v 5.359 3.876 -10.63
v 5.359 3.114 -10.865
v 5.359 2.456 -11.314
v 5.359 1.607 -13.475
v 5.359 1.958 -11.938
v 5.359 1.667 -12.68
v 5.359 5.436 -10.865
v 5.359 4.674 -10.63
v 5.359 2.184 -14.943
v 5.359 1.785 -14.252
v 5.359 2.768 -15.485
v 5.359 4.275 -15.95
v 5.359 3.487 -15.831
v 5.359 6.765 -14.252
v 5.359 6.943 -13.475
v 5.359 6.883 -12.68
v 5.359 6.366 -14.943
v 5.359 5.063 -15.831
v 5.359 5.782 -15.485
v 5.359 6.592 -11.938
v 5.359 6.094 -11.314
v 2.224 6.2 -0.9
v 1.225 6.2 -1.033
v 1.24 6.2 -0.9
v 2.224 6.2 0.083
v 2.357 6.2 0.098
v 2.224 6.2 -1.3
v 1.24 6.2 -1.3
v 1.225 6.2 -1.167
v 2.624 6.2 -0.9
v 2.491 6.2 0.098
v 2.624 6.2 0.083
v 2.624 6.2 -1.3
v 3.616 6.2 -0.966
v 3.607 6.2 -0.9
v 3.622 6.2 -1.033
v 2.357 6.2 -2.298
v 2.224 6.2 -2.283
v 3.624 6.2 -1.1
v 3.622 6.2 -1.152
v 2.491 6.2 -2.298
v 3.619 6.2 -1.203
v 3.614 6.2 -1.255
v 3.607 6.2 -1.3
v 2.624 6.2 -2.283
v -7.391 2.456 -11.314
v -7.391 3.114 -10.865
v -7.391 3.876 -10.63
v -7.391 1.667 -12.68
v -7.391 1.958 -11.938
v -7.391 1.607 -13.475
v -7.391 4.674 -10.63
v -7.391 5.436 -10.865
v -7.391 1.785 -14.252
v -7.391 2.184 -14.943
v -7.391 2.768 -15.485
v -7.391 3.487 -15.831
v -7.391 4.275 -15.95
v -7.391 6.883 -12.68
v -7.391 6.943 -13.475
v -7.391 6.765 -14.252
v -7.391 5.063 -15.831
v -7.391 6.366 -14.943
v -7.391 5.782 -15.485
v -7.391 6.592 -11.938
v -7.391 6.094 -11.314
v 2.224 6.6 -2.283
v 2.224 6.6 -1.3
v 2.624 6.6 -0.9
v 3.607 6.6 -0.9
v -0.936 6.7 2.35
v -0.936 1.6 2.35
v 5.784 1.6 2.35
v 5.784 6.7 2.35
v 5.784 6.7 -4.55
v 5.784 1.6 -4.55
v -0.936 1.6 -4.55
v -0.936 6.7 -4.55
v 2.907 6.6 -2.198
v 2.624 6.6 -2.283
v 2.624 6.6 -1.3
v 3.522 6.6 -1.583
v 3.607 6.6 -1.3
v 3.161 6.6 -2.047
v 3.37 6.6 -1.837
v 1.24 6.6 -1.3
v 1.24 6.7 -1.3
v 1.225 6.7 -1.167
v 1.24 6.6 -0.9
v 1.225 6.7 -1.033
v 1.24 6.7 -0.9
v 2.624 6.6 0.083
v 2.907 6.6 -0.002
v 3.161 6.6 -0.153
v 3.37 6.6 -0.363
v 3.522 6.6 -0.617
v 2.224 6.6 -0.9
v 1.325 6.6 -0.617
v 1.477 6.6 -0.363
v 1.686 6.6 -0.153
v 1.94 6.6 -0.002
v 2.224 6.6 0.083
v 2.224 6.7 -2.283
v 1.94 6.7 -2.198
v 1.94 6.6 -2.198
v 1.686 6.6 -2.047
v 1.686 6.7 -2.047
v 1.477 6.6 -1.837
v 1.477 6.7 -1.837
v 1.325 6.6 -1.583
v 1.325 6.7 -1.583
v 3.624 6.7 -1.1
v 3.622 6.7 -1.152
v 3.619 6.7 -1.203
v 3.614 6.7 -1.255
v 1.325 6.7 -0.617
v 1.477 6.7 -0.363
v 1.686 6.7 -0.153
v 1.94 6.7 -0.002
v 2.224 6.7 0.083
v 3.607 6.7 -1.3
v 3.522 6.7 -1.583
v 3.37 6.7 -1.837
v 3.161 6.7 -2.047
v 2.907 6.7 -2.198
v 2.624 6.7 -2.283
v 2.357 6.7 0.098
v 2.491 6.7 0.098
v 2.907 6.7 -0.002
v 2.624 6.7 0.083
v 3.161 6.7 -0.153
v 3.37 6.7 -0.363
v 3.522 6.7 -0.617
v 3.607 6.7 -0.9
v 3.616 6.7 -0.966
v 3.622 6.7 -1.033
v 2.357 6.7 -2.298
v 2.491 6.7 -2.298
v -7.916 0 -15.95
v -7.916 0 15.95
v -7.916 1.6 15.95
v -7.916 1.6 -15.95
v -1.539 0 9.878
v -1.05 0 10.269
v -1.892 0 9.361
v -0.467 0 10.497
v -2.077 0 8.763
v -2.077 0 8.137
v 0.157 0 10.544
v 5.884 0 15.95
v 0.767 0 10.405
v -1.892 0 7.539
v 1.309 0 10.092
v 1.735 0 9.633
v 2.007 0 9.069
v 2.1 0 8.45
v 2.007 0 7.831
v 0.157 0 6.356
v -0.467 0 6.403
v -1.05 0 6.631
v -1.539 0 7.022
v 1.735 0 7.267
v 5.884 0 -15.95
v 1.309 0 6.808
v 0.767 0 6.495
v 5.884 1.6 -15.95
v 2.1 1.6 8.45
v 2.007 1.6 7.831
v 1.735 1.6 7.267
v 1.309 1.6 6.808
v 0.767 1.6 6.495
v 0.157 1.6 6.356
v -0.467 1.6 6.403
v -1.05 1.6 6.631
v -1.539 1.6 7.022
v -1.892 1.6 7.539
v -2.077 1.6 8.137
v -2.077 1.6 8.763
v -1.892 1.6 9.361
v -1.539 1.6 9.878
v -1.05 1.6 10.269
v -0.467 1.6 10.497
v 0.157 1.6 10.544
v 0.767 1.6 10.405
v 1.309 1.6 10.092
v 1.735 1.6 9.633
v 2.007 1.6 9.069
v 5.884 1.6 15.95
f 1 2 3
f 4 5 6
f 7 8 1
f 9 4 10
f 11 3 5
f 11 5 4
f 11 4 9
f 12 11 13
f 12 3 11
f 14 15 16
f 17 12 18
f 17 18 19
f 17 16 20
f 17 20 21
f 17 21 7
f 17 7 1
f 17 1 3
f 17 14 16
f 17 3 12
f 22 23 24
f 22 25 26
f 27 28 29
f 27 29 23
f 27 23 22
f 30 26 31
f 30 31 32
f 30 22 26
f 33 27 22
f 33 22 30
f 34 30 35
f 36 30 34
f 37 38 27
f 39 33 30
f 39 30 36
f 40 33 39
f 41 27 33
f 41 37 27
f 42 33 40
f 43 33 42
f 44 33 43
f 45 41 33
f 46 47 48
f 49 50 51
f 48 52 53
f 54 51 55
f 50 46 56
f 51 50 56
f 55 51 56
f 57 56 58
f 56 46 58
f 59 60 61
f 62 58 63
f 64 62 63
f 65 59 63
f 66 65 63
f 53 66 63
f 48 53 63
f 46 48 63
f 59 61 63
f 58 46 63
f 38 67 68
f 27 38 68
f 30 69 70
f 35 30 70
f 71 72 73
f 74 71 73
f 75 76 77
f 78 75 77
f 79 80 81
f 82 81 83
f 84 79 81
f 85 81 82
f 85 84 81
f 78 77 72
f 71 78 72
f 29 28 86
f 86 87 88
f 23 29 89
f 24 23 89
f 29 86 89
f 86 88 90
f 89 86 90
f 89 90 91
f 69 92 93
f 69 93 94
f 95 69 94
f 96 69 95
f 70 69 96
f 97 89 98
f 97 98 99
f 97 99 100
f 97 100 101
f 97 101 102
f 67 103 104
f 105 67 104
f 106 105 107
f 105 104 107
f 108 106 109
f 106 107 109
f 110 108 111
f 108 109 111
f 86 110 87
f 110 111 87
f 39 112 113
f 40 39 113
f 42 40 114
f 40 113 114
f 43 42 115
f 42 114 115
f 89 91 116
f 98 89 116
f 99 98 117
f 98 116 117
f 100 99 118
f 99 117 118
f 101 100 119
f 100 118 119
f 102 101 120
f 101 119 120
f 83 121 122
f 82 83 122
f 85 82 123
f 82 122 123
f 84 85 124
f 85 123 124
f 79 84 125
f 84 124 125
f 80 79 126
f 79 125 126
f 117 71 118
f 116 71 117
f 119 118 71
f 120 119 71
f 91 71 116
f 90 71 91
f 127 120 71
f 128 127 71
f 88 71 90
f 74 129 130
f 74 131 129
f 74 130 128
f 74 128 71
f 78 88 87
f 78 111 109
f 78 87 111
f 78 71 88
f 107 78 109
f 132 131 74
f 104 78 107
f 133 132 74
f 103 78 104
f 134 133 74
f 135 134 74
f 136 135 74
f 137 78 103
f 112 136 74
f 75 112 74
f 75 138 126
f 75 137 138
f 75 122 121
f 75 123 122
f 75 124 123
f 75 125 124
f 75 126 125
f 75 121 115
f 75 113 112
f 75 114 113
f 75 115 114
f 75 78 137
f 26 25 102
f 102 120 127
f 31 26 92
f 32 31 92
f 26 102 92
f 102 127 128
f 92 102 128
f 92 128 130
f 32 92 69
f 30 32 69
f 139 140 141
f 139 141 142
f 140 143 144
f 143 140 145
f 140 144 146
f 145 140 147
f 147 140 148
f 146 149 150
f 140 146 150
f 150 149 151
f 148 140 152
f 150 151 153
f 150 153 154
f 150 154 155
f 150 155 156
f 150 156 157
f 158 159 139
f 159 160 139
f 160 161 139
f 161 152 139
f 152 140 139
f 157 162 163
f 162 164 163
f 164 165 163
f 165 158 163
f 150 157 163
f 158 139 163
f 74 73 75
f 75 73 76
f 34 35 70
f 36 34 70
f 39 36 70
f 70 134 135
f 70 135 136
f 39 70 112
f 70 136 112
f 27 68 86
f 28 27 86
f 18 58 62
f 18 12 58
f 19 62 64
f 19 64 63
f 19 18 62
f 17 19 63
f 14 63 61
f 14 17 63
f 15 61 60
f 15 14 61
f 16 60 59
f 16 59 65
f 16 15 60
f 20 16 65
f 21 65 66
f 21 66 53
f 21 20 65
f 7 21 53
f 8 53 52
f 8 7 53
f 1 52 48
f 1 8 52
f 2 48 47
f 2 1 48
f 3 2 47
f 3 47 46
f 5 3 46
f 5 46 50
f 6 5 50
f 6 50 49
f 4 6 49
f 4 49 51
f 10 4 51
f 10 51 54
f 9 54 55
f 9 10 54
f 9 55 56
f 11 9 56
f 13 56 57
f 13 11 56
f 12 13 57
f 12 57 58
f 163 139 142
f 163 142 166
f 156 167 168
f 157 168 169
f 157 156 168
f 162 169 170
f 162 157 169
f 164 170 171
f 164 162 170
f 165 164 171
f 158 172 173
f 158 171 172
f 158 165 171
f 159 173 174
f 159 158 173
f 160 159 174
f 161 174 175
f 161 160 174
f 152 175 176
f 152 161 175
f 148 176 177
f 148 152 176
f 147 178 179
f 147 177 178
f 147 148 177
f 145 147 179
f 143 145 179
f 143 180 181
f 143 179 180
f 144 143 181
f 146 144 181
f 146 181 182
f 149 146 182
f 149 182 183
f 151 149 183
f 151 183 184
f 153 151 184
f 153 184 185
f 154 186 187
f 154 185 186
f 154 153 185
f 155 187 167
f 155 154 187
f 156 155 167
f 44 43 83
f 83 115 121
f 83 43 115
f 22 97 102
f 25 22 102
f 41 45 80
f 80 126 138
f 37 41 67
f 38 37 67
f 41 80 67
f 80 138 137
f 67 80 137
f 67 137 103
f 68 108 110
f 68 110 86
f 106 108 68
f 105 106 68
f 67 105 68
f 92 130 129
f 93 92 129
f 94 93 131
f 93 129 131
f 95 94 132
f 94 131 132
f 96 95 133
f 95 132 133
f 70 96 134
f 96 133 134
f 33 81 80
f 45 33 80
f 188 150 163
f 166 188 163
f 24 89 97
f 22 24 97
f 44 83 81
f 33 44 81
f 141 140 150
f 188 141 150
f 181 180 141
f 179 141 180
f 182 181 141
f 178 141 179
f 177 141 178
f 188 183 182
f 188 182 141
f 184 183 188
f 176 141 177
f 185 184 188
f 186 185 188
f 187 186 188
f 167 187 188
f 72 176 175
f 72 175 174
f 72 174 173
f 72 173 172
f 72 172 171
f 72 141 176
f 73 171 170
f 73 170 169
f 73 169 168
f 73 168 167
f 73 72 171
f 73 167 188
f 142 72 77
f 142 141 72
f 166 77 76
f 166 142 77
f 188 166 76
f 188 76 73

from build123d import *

# Parameters (mm, degrees)
SKETCH1_W                = 13.8
SKETCH1_H                = 31.9
BOSS_EXTRUDE1_DEPTH      = 1.6
SKETCH1_3_R              = 2.1
CUT_EXTRUDE2_DEPTH       = 18.878253538
BOSS_EXTRUDE2_DEPTH      = 6.7
BOSS_EXTRUDE3_DEPTH      = 6.375
BOSS_EXTRUDE3_DEPTH_BACK = 6.375
CUT_EXTRUDE7_DEPTH       = 0.1
CUT_EXTRUDE8_DEPTH       = 0.5


with BuildPart() as part:
    # Sketch1 → Boss-Extrude1 (new body)
    with BuildSketch(Plane(origin=(0, 0, 0), x_dir=(1, 0, 0), z_dir=(0, 1, 0))):
        with Locations((-1.016403829, 0)):
            Rectangle(SKETCH1_W, SKETCH1_H)
    extrude(amount=BOSS_EXTRUDE1_DEPTH)

    # Sketch1<3> → Cut-Extrude2 (cut, through all)
    with BuildSketch(Plane(origin=(0, 0, 0), x_dir=(1, 0, 0), z_dir=(0, 1, 0))):
        with Locations((0, -8.45)):
            Circle(SKETCH1_3_R)
    extrude(amount=CUT_EXTRUDE2_DEPTH, mode=Mode.SUBTRACT)

    # Sketch1<4> → Boss-Extrude2 (add)
    with BuildSketch(Plane(origin=(0, 0, 0), x_dir=(1, 0, 0), z_dir=(0, 1, 0))):
        Polygon((-0.936403829, 4.55), (-0.936403829, -2.35), (-0.836403829, -2.35), (5.783596171, -2.35), (5.783596171, 4.55), (-0.836403829, 4.55), align=None)
    extrude(amount=BOSS_EXTRUDE2_DEPTH)

    # Sketch5 → Cut-Extrude7 (cut)
    with BuildSketch(Plane(origin=(0, 6.7, 0), x_dir=(1, 0, 0), z_dir=(0, 1, 0))):
        with BuildLine():
            Line((1.240380214, 1.3), (2.223596171, 1.3))
            Line((2.223596171, 1.3), (2.223596171, 2.283215957))
            ThreePointArc((2.223596171, 2.283215957), (1.575068034, 1.948528137), (1.240380214, 1.3))
        make_face()
        with BuildLine():
            Line((2.223596171, 0.9), (1.240380214, 0.9))
            ThreePointArc((1.240380214, 0.9), (1.575068034, 0.251471863), (2.223596171, -0.083215957))
            Line((2.223596171, -0.083215957), (2.223596171, 0.9))
        make_face()
        with BuildLine():
            ThreePointArc((3.606812128, 1.3), (3.272124308, 1.948528137), (2.623596171, 2.283215957))
            Line((2.623596171, 2.283215957), (2.623596171, 1.3))
            Line((2.623596171, 1.3), (3.606812128, 1.3))
        make_face()
        with BuildLine():
            Line((2.623596171, 0.9), (2.623596171, -0.083215957))
            ThreePointArc((2.623596171, -0.083215957), (3.272124308, 0.251471863), (3.606812128, 0.9))
            Line((3.606812128, 0.9), (2.623596171, 0.9))
        make_face()
    extrude(amount=-CUT_EXTRUDE7_DEPTH, mode=Mode.SUBTRACT)

    # Sketch5<3> → Cut-Extrude8 (cut)
    with BuildSketch(Plane(origin=(0, 6.7, 0), x_dir=(1, 0, 0), z_dir=(0, 1, 0))):
        with BuildLine():
            Line((2.223596171, 2.283215957), (2.223596171, 1.3))
            Line((2.223596171, 1.3), (1.240380214, 1.3))
            ThreePointArc((1.240380214, 1.3), (1.223596171, 1.1), (1.240380214, 0.9))
            Line((1.240380214, 0.9), (2.223596171, 0.9))
            Line((2.223596171, 0.9), (2.223596171, -0.083215957))
            ThreePointArc((2.223596171, -0.083215957), (2.423596171, -0.1), (2.623596171, -0.083215957))
            Line((2.623596171, -0.083215957), (2.623596171, 0.9))
            Line((2.623596171, 0.9), (3.606812128, 0.9))
            ThreePointArc((3.606812128, 0.9), (3.619392798, 0.999648488), (3.623596171, 1.1))
            ThreePointArc((3.623596171, 1.1), (3.62109357, 1.177459529), (3.613596207, 1.254595974))
            Line((3.613596207, 1.254595974), (3.606812128, 1.3))
            Line((3.606812128, 1.3), (2.623596171, 1.3))
            Line((2.623596171, 1.3), (2.623596171, 2.283215957))
            ThreePointArc((2.623596171, 2.283215957), (2.423596171, 2.3), (2.223596171, 2.283215957))
        make_face()
    extrude(amount=-CUT_EXTRUDE8_DEPTH, mode=Mode.SUBTRACT)


with BuildPart() as body_2:
    # Sketch3 → Boss-Extrude3 (new, two sides: drawn at the far end of the back side and taken through both)
    with BuildSketch(Plane(origin=(-1.016403829, 0, 0), x_dir=(0, 0, -1), z_dir=(1, 0, 0)).offset(-BOSS_EXTRUDE3_DEPTH_BACK)):
        with BuildLine():
            ThreePointArc((13.275, 6.95), (11.38348936, 2.38348936), (15.95, 4.275))
            ThreePointArc((15.95, 4.275), (15.16651064, 6.16651064), (13.275, 6.95))
        make_face()
    extrude(amount=BOSS_EXTRUDE3_DEPTH + BOSS_EXTRUDE3_DEPTH_BACK)


solid = Compound([part.part, body_2.part])
